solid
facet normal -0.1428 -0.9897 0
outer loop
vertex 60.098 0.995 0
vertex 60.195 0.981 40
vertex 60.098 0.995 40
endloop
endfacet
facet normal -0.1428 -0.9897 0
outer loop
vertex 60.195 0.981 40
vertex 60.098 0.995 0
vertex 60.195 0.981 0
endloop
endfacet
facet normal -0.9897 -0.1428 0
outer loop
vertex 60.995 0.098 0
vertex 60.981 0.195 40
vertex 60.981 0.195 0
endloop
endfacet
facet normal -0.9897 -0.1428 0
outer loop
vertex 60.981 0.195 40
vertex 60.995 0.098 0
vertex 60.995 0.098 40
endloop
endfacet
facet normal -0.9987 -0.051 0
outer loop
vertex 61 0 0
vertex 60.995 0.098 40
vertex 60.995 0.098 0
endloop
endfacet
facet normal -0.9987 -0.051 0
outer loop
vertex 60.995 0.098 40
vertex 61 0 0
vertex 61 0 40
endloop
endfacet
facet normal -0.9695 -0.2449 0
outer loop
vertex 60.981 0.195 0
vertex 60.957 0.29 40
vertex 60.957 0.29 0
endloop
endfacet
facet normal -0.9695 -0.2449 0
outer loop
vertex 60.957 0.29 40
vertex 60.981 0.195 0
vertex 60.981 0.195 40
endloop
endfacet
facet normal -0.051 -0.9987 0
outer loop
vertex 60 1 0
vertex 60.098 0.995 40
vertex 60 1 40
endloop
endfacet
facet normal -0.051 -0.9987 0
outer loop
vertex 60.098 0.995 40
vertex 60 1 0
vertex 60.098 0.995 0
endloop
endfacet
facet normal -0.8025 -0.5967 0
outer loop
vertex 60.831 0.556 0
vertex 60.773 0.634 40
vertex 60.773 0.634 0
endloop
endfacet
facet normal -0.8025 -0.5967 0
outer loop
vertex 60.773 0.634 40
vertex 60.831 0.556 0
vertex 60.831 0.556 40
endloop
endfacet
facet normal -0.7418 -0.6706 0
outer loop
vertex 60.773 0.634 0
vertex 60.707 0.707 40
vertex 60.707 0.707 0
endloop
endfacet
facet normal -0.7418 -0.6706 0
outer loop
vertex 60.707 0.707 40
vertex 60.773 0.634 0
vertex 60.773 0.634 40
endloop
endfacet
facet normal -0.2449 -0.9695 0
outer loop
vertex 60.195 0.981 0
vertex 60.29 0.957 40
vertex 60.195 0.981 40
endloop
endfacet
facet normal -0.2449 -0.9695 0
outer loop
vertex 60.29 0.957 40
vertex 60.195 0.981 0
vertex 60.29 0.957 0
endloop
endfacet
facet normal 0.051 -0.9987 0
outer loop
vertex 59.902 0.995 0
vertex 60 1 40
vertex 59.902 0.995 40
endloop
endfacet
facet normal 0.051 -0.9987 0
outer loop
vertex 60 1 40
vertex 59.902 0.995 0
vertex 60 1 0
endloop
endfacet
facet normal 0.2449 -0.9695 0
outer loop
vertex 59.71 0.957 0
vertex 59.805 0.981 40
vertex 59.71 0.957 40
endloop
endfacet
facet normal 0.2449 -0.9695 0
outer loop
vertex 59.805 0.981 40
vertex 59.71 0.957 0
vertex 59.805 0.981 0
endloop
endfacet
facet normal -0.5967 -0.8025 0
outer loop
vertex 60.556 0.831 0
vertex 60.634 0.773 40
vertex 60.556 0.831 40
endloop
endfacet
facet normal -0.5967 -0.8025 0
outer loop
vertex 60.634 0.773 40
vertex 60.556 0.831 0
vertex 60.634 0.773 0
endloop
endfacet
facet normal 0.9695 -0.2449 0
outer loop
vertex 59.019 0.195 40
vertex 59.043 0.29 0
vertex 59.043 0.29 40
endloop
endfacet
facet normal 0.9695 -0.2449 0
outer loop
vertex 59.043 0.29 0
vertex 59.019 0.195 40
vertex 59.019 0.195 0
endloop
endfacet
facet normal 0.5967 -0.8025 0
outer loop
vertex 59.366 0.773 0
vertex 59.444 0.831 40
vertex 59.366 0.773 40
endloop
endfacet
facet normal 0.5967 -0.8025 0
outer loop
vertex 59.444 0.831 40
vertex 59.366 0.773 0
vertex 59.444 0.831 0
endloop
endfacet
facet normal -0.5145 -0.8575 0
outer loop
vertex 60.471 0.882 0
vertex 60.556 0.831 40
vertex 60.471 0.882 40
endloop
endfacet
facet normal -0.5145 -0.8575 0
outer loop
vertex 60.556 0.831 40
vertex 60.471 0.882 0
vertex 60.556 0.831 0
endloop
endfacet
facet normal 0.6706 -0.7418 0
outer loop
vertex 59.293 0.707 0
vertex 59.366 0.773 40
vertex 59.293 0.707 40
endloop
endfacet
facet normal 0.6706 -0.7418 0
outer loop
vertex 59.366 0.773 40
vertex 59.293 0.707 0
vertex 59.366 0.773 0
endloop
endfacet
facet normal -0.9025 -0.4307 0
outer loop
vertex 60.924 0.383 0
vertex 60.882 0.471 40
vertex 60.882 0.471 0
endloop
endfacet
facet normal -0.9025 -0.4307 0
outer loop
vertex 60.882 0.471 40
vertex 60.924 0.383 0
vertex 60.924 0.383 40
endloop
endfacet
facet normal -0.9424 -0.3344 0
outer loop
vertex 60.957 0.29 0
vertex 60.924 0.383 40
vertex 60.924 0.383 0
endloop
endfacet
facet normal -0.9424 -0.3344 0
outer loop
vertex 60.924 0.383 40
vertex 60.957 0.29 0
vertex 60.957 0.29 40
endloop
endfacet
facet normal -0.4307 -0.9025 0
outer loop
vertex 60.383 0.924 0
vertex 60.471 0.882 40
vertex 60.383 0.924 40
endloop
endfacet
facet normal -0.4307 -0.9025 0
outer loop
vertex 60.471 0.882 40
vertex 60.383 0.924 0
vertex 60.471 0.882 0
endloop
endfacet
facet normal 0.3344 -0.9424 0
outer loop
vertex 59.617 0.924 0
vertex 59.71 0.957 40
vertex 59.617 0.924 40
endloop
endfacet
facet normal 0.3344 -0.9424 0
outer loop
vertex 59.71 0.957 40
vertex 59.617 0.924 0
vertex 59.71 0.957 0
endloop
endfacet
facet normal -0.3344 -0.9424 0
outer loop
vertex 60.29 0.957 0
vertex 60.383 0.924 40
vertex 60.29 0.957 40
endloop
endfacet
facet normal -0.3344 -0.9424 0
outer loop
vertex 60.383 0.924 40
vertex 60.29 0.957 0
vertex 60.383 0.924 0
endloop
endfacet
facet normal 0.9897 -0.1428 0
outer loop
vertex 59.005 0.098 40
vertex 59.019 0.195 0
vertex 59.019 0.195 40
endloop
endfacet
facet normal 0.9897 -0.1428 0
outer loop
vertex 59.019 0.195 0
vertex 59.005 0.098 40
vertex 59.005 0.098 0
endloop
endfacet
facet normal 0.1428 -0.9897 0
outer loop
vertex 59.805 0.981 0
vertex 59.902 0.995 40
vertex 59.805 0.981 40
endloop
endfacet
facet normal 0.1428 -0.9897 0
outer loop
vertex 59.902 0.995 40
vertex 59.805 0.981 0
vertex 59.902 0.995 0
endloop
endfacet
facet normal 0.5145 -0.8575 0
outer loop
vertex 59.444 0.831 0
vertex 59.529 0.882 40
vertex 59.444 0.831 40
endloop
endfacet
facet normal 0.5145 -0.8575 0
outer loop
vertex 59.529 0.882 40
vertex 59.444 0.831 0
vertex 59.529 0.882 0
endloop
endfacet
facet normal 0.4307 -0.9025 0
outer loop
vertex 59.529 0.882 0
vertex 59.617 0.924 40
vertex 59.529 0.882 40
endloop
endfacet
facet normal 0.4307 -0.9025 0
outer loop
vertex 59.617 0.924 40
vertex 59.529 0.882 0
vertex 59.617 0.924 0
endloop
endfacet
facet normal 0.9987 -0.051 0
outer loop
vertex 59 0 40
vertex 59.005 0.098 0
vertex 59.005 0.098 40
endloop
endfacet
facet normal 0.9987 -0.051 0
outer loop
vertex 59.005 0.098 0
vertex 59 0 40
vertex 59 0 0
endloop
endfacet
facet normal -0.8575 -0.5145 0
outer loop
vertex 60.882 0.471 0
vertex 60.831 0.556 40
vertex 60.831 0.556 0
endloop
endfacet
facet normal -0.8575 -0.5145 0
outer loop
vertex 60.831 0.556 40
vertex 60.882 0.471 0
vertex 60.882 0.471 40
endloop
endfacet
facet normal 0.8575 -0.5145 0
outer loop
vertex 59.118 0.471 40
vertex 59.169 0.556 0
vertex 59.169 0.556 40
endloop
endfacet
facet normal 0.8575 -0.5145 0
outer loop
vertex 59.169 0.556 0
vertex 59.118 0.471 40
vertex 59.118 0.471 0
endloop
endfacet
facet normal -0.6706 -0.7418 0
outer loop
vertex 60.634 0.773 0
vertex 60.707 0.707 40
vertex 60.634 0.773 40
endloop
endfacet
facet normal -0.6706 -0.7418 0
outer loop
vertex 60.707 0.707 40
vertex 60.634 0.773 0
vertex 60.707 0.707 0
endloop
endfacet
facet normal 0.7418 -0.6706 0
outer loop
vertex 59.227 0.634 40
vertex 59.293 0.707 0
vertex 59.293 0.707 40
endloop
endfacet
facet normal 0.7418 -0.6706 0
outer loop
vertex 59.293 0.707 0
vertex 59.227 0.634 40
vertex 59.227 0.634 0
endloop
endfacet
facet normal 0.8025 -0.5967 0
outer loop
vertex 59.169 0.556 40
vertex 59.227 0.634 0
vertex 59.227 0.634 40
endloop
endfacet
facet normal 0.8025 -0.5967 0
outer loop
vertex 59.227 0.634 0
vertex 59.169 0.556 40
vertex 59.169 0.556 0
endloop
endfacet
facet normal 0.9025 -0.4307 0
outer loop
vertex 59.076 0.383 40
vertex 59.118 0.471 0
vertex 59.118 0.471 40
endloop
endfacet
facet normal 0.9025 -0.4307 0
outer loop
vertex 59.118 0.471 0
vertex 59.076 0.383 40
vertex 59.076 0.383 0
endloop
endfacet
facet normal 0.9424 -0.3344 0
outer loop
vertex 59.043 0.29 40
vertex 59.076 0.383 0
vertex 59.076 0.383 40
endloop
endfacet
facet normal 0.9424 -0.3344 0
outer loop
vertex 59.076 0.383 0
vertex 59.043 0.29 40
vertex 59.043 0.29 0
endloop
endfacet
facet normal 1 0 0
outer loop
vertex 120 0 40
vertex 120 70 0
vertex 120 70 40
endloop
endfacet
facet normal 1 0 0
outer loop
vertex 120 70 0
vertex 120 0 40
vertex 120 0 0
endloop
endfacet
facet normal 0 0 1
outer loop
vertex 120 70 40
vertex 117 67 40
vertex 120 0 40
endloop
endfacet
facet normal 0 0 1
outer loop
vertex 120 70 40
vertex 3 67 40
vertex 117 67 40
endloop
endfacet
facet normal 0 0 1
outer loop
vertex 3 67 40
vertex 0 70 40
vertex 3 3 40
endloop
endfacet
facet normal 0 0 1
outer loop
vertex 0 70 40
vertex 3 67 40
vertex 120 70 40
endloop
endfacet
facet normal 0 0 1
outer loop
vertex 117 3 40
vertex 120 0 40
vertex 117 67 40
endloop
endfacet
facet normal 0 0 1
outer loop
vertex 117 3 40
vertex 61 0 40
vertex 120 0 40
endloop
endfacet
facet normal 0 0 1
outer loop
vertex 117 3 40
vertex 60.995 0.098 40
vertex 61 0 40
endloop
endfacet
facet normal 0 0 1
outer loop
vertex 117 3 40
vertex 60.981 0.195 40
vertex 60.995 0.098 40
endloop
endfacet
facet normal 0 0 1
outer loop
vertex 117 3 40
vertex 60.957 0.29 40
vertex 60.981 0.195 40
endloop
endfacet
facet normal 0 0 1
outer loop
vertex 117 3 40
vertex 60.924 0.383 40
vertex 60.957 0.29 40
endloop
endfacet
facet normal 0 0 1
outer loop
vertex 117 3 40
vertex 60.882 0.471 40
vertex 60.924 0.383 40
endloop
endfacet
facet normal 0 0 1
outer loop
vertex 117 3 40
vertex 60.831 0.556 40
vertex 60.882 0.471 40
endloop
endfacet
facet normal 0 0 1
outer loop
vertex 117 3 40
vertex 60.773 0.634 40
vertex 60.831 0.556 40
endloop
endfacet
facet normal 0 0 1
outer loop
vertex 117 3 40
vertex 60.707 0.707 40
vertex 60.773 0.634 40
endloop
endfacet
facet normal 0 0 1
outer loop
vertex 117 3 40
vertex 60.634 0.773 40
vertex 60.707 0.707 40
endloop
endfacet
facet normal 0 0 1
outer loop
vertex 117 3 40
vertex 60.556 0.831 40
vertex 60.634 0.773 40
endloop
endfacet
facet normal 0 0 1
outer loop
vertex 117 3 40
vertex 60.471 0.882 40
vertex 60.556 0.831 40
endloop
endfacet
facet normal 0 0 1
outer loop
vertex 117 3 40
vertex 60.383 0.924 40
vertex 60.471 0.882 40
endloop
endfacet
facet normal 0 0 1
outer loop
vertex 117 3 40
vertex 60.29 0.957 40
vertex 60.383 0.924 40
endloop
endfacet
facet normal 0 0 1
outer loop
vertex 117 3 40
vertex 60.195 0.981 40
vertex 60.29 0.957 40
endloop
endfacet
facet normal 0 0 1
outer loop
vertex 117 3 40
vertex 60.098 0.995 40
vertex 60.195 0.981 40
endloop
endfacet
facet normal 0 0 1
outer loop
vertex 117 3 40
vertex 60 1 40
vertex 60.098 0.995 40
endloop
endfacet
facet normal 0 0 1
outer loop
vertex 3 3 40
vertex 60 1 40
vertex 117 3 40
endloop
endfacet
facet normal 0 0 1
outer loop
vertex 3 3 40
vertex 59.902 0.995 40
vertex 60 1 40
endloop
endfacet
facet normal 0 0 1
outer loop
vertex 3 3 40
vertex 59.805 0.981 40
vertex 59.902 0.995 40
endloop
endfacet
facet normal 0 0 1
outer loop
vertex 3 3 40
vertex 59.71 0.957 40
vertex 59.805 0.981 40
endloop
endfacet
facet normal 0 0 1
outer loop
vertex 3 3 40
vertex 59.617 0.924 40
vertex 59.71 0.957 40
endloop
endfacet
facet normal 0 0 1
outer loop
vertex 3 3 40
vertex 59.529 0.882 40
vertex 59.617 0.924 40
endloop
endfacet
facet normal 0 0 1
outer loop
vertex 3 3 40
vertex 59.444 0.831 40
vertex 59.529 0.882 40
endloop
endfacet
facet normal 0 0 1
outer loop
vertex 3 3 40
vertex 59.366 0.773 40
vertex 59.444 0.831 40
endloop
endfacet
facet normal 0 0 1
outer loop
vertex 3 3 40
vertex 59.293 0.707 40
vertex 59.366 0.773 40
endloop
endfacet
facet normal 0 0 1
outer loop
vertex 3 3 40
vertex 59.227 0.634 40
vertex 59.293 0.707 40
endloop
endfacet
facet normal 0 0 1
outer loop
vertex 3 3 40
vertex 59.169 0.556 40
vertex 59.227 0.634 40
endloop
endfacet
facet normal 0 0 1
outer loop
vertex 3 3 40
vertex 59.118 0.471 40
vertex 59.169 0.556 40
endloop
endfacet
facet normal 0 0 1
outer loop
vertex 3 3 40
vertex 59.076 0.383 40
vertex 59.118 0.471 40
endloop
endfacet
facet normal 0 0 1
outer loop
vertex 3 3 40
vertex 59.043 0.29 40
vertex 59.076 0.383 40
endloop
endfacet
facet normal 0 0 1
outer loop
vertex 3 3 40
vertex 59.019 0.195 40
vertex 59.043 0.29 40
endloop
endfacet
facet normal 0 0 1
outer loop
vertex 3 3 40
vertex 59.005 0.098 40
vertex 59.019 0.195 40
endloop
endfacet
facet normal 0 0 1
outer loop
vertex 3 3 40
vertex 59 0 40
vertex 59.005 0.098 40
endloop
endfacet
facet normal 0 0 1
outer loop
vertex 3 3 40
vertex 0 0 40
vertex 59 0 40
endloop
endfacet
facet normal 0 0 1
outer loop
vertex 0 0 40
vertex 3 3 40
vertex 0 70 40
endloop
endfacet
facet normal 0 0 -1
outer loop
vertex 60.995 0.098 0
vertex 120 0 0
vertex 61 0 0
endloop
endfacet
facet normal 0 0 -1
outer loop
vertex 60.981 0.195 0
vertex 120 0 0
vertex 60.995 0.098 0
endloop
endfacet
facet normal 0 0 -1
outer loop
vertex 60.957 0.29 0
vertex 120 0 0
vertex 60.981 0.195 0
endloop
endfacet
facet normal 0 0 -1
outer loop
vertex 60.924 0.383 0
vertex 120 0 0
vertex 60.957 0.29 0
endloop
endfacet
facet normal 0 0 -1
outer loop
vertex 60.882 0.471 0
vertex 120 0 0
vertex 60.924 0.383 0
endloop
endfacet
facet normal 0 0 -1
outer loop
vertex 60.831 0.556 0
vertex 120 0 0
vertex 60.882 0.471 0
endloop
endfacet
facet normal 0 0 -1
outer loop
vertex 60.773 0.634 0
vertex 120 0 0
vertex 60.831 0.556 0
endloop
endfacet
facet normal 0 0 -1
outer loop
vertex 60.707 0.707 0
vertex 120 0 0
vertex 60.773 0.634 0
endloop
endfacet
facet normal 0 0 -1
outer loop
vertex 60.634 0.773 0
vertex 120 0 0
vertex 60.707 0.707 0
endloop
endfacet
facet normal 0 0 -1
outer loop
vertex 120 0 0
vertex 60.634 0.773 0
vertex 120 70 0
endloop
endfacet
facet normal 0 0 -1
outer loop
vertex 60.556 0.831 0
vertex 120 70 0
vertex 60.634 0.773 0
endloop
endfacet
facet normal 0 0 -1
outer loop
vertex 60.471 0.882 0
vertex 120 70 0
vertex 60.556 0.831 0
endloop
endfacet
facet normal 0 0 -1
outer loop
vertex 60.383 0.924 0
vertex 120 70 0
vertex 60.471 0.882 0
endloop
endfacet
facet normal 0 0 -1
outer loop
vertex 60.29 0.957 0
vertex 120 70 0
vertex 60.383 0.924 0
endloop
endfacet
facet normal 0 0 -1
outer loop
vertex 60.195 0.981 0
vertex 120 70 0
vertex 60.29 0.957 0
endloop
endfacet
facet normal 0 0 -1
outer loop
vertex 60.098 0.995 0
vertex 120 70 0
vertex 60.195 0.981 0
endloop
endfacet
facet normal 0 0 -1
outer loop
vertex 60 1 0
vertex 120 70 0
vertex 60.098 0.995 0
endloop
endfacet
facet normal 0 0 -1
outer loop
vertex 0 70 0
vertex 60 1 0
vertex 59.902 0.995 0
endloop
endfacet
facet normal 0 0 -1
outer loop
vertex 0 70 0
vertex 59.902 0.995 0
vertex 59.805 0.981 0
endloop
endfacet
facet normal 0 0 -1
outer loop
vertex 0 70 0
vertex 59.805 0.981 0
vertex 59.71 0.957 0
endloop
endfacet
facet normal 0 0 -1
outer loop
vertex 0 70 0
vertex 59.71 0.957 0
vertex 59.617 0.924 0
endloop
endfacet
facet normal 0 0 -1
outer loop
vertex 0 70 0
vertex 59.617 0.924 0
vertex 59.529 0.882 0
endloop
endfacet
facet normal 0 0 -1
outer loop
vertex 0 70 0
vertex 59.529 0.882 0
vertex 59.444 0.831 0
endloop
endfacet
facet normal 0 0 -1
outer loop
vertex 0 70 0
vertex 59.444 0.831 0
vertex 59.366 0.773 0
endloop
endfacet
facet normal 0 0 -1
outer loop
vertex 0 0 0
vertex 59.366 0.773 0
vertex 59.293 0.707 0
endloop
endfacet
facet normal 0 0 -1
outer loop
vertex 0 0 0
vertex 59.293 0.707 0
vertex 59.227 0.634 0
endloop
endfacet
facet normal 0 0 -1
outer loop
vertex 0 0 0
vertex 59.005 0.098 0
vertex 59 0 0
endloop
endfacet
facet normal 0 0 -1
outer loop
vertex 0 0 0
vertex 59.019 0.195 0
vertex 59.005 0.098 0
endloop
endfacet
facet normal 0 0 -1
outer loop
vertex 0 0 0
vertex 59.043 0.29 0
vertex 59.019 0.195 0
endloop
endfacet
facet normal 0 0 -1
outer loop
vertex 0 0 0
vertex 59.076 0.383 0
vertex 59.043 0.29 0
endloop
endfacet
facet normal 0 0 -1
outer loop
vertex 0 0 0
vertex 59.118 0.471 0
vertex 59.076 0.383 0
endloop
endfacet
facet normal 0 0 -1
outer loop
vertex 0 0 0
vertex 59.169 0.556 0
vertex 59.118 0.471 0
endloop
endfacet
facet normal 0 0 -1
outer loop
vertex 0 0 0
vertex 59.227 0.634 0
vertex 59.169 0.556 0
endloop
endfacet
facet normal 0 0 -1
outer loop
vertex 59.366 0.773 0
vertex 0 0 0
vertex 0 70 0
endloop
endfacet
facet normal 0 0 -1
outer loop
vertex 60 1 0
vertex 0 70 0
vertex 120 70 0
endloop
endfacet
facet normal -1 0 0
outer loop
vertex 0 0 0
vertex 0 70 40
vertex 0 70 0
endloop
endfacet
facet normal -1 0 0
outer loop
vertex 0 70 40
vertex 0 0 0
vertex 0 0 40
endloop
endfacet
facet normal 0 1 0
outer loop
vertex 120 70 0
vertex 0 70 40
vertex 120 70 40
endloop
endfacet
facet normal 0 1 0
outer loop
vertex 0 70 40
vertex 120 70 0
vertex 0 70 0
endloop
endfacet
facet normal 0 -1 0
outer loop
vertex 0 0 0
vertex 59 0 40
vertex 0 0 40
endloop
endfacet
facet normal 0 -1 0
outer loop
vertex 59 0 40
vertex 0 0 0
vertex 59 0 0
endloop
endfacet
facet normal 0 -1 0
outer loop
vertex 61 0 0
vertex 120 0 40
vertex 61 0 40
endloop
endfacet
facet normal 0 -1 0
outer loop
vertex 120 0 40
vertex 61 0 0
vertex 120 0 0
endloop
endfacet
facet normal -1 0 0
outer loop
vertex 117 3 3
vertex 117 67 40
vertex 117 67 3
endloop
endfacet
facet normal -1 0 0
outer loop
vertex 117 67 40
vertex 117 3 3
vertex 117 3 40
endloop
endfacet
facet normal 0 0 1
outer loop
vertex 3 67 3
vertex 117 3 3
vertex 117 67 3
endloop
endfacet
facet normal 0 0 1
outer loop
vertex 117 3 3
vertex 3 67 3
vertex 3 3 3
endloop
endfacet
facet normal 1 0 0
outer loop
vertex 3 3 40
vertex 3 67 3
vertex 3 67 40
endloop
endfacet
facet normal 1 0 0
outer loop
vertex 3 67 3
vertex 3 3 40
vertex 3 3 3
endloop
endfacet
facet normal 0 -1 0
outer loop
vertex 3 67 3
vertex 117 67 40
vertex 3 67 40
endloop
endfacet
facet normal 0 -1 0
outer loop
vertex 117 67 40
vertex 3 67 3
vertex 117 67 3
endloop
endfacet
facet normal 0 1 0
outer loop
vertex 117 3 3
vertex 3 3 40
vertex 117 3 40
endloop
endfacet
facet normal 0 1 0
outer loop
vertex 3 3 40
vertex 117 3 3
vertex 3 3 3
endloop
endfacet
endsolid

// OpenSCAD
$fn = 64;

// Outer dimensions (mm)
$outer_x = 120;
$outer_y = 70;
$outer_z = 40;

// Wall and floor thickness (mm)
$wall_thickness = 3;
$floor_thickness = 3;

// Inner dimensions (mm)
$inner_x = $outer_x - 2 * $wall_thickness;
$inner_y = $outer_y - 2 * $wall_thickness;
$inner_z = $outer_z - $floor_thickness;

// Platform dimensions (mm)
$platform_length = 60;
$platform_width = $inner_y;
$platform_height = 10;

// Hole dimensions (mm)
$hole_diameter = 2;
$hole_radius = $hole_diameter / 2;
$hole_z = 30;
$hole_y = 0;

// Build the tank
difference() {
    // Main tank body (outer box)
    cube([
        $outer_x,
        $outer_y,
        $outer_z
    ], center = false);
    
    // Cut out inner cavity (open top)
    translate([
        $wall_thickness,
        $wall_thickness,
        $floor_thickness
    ])
    cube([
        $inner_x,
        $inner_y,
        $inner_z
    ], center = false);
    
    // Cut out platform cavity (space above platform)
    translate([
        ($outer_x - $platform_length) / 2,
        $wall_thickness,
        $floor_thickness + $platform_height
    ])
    cube([
        $platform_length,
        $inner_y,
        $outer_z - ($floor_thickness + $platform_height)
    ], center = false);
    
    // Cut out electrode holes (horizontal cylinders along X)
    for (side = [-1, 1]) {
        translate([
            side * ($outer_x / 2),
            $hole_y,
            $hole_z
        ])
        cylinder(
            r = $hole_radius,
            h = $outer_x,
            axis = [1, 0, 0],
            center = true
        );
    }
}
